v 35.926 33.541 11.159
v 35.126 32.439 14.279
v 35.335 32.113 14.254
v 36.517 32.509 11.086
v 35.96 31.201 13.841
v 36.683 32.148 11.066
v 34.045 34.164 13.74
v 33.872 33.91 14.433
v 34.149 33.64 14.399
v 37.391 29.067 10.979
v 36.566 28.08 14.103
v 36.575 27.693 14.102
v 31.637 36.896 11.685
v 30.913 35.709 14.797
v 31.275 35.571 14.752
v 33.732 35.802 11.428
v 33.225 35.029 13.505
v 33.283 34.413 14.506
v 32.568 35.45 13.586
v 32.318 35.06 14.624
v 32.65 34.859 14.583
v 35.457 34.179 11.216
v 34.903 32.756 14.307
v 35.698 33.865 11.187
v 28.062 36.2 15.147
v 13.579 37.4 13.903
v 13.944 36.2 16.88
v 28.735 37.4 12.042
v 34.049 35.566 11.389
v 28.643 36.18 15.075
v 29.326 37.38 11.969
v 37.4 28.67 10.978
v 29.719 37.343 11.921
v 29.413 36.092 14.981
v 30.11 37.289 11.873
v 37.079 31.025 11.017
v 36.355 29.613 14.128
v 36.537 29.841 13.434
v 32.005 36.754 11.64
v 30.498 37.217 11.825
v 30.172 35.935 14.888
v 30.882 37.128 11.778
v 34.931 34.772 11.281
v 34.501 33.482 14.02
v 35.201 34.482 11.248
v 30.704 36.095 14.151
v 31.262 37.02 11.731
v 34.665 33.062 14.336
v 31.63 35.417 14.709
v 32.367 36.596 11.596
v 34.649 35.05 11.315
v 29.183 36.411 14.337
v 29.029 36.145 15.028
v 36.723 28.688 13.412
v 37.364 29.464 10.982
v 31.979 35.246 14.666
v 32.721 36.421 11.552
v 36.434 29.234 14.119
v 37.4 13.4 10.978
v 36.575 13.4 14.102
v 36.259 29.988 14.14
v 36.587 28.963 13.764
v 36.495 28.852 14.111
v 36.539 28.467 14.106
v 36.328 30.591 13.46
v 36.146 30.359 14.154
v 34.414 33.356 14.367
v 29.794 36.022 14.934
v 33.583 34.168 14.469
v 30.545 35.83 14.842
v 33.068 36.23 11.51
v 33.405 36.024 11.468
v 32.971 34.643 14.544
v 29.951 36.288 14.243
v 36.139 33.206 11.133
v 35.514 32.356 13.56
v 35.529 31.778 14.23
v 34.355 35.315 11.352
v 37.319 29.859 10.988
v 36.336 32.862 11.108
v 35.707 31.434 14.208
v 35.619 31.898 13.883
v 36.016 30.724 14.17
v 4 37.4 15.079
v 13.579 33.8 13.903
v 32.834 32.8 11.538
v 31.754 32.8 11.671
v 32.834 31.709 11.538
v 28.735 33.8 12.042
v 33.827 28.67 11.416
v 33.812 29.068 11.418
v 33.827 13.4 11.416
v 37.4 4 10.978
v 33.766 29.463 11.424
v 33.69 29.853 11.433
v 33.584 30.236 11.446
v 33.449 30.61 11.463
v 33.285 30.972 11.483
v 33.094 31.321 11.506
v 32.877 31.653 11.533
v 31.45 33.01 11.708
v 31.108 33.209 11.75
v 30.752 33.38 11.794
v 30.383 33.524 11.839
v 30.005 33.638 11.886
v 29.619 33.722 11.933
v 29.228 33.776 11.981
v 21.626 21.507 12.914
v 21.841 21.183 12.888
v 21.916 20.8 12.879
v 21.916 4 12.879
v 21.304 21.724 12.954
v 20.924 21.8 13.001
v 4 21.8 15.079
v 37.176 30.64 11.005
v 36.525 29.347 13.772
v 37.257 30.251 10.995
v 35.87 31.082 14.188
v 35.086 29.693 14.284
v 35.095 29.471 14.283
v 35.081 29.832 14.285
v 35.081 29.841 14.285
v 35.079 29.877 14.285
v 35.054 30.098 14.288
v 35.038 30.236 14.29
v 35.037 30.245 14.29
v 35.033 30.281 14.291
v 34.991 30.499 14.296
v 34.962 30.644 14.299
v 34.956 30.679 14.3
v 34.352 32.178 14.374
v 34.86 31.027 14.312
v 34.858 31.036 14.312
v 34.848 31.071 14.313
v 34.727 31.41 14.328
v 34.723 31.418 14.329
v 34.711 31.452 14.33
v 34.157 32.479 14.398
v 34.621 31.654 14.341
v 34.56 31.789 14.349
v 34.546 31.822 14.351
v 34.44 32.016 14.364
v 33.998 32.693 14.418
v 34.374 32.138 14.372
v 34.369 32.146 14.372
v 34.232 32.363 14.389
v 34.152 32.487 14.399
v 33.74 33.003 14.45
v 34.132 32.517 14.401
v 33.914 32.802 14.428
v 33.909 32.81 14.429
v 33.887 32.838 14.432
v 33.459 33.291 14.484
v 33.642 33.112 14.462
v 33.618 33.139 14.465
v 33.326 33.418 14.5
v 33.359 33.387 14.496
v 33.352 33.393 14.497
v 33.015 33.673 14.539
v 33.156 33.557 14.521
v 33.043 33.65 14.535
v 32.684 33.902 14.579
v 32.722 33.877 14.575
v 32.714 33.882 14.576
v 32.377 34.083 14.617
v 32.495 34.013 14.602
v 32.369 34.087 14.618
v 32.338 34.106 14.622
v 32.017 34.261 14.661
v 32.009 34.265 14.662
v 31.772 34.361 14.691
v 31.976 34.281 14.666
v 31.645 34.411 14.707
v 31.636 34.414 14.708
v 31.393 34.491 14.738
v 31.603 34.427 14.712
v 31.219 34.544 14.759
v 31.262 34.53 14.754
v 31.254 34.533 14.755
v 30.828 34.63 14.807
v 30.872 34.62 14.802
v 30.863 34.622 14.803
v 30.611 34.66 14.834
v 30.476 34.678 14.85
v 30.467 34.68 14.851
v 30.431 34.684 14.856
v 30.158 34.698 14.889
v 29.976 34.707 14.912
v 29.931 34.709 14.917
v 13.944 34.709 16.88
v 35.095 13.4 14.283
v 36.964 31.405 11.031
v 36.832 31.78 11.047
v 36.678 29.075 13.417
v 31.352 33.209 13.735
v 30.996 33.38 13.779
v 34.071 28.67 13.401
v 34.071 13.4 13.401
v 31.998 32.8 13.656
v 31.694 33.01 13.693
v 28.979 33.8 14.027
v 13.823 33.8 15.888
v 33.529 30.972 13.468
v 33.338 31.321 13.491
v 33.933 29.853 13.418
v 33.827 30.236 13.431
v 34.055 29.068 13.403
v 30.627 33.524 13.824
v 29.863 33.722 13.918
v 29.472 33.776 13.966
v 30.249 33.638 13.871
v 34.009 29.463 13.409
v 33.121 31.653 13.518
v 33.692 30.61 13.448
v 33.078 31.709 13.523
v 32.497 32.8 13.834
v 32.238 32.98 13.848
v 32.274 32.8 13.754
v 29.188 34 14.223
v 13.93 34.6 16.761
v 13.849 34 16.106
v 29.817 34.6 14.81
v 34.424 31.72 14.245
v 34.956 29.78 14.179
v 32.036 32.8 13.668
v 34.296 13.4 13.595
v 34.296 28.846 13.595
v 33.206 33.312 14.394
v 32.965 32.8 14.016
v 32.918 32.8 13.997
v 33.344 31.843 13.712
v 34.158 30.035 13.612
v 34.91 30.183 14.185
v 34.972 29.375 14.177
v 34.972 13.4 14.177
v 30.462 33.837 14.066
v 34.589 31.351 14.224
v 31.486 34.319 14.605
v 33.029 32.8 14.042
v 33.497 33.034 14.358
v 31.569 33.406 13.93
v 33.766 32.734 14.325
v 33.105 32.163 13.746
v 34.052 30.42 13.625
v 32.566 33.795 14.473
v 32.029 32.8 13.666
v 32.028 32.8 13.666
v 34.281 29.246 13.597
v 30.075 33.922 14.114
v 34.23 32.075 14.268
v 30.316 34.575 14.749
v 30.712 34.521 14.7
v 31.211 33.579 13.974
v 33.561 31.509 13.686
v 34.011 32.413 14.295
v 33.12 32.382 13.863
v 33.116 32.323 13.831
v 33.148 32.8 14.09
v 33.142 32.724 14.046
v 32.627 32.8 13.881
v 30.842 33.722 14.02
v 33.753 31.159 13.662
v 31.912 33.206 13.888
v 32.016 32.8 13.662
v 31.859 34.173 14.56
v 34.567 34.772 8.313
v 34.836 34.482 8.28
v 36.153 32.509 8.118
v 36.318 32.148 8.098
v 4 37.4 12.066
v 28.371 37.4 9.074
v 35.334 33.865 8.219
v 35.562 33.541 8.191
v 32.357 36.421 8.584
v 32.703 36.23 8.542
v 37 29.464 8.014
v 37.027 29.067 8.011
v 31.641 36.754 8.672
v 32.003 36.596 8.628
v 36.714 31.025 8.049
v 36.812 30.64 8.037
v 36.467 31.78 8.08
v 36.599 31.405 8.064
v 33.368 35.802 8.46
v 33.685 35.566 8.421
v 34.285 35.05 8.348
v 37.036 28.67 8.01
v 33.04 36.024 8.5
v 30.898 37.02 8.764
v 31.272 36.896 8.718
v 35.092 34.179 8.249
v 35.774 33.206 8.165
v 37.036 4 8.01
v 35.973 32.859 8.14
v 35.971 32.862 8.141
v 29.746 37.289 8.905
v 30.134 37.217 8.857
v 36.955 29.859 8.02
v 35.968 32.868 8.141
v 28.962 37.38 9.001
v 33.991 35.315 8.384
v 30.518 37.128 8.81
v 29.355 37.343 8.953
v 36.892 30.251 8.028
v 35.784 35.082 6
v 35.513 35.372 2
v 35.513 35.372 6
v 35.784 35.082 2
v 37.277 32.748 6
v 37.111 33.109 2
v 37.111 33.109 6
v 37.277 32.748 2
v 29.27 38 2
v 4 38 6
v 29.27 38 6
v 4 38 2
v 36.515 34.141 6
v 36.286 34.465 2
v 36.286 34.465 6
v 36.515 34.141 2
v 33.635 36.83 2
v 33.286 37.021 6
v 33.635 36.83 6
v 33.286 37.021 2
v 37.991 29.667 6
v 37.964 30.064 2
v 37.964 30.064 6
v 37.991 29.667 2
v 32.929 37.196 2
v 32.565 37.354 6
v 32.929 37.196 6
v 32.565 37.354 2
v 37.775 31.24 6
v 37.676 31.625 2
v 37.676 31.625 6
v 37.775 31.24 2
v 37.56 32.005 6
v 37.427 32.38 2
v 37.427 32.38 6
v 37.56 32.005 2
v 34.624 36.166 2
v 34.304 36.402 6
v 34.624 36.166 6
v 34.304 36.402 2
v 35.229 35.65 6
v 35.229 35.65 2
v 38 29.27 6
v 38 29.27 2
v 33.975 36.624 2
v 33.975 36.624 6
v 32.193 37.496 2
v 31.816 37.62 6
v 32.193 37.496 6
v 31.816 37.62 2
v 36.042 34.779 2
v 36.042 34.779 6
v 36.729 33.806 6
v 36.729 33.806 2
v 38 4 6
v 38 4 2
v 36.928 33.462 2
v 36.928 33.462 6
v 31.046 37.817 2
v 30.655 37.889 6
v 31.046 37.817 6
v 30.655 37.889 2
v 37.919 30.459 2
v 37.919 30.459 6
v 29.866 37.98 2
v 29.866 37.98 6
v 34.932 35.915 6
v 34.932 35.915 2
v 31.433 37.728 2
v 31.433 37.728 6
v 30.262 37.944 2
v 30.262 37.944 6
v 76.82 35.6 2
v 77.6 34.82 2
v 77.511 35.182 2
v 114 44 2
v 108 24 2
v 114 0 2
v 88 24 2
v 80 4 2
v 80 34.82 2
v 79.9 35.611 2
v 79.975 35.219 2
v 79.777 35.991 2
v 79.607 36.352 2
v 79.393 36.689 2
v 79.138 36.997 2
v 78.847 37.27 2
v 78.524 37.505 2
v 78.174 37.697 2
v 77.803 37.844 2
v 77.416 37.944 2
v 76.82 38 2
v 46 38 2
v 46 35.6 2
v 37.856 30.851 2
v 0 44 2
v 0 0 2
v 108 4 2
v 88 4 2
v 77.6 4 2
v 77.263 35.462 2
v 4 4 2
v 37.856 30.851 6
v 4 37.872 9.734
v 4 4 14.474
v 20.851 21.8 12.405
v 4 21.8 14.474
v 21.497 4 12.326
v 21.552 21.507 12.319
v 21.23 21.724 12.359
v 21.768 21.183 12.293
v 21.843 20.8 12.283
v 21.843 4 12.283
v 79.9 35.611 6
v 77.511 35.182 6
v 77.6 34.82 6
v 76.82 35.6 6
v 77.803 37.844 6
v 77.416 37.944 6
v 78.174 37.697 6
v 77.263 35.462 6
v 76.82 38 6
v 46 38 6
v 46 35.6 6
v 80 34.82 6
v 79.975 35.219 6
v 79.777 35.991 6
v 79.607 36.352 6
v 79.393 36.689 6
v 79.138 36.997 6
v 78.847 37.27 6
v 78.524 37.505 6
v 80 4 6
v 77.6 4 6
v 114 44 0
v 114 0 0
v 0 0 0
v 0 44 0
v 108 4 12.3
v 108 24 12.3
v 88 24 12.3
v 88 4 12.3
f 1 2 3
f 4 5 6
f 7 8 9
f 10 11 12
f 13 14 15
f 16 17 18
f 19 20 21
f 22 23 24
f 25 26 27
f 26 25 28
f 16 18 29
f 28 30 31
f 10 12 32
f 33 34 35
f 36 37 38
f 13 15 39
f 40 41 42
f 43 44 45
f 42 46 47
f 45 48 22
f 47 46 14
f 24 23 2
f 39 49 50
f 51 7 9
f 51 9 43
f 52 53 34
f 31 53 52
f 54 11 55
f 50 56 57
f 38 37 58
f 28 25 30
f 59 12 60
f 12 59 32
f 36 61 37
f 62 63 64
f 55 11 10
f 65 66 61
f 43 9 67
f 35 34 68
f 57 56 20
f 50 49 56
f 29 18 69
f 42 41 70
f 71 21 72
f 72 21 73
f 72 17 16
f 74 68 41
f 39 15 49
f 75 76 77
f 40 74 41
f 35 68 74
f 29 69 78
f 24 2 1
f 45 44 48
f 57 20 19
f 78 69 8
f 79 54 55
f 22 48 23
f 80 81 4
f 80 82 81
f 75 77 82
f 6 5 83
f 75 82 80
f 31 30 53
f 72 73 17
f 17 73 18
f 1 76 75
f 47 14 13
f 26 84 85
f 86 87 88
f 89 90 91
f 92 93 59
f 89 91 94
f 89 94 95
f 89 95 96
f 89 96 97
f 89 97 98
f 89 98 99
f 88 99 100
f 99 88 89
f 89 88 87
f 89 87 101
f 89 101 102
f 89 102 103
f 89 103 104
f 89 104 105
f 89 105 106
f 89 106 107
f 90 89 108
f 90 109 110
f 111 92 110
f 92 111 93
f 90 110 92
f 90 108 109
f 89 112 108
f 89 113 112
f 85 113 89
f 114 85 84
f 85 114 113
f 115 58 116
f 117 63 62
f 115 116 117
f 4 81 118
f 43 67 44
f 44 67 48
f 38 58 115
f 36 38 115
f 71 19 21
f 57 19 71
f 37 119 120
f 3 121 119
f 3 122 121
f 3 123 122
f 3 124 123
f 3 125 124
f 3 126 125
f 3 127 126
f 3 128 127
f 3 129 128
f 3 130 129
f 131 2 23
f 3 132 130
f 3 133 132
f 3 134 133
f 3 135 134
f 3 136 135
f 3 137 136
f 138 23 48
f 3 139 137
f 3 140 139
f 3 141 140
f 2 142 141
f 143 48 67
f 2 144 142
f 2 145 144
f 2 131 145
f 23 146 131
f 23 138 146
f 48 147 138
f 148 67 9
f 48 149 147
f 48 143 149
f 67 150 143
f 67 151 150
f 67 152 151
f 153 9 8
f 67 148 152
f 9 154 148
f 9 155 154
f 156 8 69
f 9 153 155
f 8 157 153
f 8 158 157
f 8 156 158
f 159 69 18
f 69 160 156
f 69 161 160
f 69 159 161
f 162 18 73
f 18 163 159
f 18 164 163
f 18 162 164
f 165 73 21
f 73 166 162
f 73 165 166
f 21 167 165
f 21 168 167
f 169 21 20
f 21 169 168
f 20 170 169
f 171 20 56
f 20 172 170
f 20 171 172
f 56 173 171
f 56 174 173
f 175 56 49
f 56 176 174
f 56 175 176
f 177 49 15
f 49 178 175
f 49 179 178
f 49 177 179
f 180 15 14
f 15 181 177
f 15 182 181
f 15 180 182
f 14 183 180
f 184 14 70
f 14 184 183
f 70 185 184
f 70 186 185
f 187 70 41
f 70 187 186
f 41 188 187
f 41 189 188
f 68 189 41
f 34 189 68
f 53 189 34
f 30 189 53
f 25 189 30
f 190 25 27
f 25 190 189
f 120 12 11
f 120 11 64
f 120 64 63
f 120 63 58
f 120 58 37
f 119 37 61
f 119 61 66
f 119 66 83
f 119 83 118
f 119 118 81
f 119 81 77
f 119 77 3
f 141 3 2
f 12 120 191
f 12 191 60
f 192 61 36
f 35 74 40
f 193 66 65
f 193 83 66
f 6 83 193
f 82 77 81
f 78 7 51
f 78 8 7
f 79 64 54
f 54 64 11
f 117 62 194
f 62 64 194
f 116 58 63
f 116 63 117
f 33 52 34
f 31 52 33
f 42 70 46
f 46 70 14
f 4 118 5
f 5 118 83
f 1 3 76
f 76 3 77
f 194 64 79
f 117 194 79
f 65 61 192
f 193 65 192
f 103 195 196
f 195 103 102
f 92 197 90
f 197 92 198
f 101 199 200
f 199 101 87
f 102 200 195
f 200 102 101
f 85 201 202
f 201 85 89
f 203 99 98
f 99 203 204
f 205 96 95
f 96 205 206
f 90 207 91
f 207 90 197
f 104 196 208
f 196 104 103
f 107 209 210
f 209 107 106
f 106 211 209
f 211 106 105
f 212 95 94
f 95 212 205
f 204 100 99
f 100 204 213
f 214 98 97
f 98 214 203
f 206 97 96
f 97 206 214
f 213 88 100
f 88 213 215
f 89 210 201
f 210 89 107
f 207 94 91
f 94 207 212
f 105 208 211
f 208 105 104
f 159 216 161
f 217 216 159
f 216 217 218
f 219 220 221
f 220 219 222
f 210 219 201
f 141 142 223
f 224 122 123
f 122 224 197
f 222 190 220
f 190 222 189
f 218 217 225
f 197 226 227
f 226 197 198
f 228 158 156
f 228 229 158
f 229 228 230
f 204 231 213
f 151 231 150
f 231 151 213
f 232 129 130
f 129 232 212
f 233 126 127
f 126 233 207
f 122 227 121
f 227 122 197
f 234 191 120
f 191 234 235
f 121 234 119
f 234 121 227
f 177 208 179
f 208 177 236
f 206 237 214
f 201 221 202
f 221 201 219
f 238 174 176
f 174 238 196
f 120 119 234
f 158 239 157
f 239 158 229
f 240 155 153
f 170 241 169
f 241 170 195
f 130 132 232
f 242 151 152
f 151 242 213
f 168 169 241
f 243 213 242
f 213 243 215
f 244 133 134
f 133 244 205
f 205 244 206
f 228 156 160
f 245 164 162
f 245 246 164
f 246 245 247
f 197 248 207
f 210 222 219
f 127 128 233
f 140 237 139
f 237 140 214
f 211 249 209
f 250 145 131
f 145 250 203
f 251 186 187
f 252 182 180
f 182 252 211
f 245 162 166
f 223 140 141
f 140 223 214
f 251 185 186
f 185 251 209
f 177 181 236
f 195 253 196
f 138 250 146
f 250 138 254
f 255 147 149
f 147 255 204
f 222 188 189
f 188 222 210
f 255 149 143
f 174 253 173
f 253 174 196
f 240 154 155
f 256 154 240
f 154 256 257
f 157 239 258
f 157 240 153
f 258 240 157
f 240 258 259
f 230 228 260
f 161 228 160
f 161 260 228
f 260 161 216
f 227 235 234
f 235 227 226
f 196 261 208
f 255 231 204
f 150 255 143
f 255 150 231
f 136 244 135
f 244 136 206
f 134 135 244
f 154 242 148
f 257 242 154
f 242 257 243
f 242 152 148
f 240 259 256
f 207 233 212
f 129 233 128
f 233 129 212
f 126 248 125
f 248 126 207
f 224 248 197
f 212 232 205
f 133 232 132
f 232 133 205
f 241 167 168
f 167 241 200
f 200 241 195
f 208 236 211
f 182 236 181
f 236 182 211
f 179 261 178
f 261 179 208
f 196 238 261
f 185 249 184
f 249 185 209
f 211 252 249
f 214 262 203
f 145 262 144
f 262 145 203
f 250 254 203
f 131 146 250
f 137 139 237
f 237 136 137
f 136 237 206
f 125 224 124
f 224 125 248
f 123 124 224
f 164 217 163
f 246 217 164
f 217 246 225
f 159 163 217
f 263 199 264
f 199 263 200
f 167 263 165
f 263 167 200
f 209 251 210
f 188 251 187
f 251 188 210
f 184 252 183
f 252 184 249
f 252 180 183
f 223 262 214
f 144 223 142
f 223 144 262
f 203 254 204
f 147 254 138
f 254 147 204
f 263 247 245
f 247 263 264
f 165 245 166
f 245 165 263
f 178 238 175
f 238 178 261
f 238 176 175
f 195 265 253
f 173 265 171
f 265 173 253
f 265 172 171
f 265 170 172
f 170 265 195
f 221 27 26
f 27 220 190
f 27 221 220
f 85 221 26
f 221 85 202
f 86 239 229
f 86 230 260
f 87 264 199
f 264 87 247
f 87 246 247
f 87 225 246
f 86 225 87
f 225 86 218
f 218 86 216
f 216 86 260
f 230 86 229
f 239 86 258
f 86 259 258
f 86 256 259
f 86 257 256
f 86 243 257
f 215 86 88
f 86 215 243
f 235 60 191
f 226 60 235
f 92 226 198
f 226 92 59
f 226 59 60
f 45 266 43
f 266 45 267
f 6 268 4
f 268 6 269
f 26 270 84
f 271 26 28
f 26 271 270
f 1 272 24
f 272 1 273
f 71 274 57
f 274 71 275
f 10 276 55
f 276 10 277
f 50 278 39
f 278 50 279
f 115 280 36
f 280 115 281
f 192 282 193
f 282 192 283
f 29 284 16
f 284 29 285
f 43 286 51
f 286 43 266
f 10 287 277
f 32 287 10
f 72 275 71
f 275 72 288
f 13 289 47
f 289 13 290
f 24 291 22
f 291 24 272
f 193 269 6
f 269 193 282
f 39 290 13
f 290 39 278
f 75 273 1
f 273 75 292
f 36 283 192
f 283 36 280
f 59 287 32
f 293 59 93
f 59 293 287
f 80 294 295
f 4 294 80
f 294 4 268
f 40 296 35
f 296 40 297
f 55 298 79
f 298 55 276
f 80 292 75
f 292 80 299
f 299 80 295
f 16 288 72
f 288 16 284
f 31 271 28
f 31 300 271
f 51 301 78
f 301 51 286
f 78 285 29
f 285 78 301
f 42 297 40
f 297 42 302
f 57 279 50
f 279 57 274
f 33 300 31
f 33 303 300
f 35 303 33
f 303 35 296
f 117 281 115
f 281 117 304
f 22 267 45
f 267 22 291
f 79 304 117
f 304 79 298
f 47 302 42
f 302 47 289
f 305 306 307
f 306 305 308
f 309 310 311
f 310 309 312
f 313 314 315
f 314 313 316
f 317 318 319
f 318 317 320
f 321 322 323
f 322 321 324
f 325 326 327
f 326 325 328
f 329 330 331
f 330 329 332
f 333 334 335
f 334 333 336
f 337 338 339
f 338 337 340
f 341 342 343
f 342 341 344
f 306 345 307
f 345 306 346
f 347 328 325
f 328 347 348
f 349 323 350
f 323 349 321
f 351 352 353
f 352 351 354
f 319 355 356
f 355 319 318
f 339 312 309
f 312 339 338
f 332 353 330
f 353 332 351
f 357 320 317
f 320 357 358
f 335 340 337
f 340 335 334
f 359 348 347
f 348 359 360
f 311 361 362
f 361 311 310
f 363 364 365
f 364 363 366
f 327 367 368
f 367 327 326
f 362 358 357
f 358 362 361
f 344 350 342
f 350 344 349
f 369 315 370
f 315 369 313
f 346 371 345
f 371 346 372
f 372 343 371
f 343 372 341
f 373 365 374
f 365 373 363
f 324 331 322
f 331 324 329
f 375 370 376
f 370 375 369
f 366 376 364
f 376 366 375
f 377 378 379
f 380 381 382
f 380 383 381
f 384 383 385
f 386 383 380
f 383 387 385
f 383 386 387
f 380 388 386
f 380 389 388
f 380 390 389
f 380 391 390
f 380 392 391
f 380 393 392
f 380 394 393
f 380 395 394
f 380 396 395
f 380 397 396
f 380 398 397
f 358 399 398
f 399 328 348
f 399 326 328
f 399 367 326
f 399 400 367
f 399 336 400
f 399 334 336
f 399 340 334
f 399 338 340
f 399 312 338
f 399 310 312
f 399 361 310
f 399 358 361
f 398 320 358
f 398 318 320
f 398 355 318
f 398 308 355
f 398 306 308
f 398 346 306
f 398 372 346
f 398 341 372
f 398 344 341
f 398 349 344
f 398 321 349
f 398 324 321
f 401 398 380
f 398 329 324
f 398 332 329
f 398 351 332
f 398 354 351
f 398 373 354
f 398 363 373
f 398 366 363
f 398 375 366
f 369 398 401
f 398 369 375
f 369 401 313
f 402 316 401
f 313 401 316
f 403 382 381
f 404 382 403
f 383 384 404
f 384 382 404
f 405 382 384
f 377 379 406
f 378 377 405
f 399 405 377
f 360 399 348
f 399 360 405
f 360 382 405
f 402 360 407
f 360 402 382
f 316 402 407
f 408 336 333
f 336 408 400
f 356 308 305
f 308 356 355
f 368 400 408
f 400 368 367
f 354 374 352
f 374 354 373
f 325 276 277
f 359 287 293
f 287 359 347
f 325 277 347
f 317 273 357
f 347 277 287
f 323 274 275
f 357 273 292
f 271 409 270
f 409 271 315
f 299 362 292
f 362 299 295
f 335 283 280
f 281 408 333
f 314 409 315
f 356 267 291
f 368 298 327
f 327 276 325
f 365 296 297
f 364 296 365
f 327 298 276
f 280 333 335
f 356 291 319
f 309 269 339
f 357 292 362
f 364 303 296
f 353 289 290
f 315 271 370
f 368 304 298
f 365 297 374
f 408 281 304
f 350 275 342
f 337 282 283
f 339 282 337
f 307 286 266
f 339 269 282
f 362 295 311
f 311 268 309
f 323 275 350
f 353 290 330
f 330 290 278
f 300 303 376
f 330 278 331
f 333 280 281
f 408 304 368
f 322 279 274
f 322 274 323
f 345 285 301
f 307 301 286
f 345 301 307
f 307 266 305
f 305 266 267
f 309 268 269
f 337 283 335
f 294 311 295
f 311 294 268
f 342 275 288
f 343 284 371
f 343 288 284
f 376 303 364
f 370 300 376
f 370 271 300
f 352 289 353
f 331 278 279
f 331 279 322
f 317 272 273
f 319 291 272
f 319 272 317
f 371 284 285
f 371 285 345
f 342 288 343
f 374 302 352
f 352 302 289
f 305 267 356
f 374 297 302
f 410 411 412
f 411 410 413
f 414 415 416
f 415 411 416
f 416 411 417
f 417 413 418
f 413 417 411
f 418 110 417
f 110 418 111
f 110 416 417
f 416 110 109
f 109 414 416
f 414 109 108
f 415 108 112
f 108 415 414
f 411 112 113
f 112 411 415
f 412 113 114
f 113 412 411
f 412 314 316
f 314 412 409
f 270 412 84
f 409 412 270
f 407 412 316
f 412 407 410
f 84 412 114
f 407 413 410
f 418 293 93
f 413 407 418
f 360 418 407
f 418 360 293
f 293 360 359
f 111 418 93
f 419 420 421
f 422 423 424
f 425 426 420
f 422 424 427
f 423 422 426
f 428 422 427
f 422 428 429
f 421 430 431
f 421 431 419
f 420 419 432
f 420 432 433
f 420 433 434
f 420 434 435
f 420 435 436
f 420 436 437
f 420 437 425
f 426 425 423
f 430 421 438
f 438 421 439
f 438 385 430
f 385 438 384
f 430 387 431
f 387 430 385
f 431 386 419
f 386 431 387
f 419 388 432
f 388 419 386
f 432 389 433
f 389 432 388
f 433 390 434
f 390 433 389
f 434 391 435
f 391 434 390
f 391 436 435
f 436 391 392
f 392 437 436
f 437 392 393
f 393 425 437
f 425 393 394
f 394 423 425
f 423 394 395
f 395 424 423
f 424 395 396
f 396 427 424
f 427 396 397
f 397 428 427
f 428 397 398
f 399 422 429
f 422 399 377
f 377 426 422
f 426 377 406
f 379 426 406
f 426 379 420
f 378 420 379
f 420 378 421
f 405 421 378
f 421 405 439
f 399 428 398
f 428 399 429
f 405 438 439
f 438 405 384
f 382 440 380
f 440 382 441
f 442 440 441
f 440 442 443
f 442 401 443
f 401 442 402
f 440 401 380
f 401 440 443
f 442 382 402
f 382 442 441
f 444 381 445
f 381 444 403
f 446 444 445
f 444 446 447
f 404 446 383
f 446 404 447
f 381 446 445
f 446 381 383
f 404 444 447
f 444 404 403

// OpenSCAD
// =============================================================================
// tilt_module.scad -- a passive fixed-angle tilt fixture for a liquid handler
// deck. It holds one ANSI/SLAS-footprint plate or reservoir at a shallow angle
// so residual liquid pools at one side of each well and a tip can reach more of
// it. There is no hinge, no actuator, and no adjustment: the angle is a printed
// constant, which is the point. An adjustable angle is an angle nobody records.
//
// WHY THIS EXISTS
//
// On a bead cleanup, an elution, or a reservoir with 400 uL left in it, the last
// few microliters are the product. A flat plate on a flat deck leaves them
// spread across the whole well bottom in a film the tip cannot chase. Tilting
// the vessel concentrates the same volume into a smaller footprint at one edge.
// That is the entire mechanism. It is geometry, not chemistry.
//
// WHAT THIS FILE DOES NOT DO
//
// It does not tell you how much liquid you will recover. No number in this file
// is a recovery figure, and none should be added, because recovery depends on
// the well geometry, the liquid class, the tip, the aspiration profile, and the
// surface energy of a molded polymer this model knows nothing about. The only
// honest recovery number is one you weighed. hardware/README.md gives the
// acceptance test that produces it. Until that test has been run, this fixture
// is an untested idea with a part number.
//
// WHAT IT COMPUTES
//
// Everything derived here is a function, and every function echoes its result at
// render time (see report() at the bottom). Two of those numbers decide whether
// the fixture is usable at all before any liquid is involved:
//
//   tip_reach_delta_mm()  how much deeper the head must travel at the far corner
//   stack_top_mm()        how much taller the loaded deck position becomes
//
// Where an input has not been measured, the corresponding function returns
// nothing and the report says NOT COMPUTED. It does not substitute a plausible
// value. An unmeasured fixture is an unproven one, and a model that quietly
// invents the missing measurement makes that impossible to notice.
//
// SAFETY -- DECK CRASH
//
// A fixture that is not positively located on the deck is a crash. It is heavier
// and taller than the plate the deck position was built for, its center of mass
// is higher, and if it can slide, rotate, or walk under gantry acceleration then
// the head's taught coordinates point at where it used to be. A tip strike on a
// printed wedge does not stop a Z axis; it snaps tips, shears the fixture, or
// drives the head into the deck. This file therefore refuses to render the full
// fixture until deck_measured is set true (see the assert in tilt_fixture()).
// That refusal is deliberate. Print the coupon, measure your deck position, then
// come back. Also re-teach every affected labware position after installing the
// fixture -- the plate no longer sits where it sat, in any of three axes.
//
// SAFETY -- WHAT THIS MATERIAL MAY TOUCH
//
// This is a HOLDER. Nothing printed here is qualified to contact samples,
// reagents, cells, or media, and dimensional conformity to ANSI/SLAS is not
// evidence of fitness for contact -- those standards say nothing about material,
// leachables, cytotoxicity, sterility, or nuclease status. FDM parts carry 4-6%
// internal porosity even at 100% infill (Wang et al., Polymers 11(7):1154,
// 2019, X-ray CT, 4.05-6.32% across raster settings) and the voids connect to
// the outer surface, so they wick liquid in and cannot be reliably cleaned;
// vapor smoothing reduces roughness without sealing the part (Popescu et al.,
// Polymers 13(23):4249, 2021). Many photopolymer resins remain cytotoxic after
// full post-cure. Keep the certified consumable between this part and the
// sample: the plate is the barrier. Wipe-down of the fixture is housekeeping,
// not decontamination. Do not autoclave -- PLA, PETG, ABS and ASA all have a
// glass transition below 121 C and will relax printed-in stress and move.
//
// PRECEDENT
//
// Parameter-block style follows hardware/tube_nest.scad in the bay-hack repo:
// every dimension named at the top, nothing magic buried in the geometry, and a
// fit coupon printed before anything large.
// =============================================================================

$fa = 2;
$fs = 0.4;

// Which solid to emit. Print "coupon" first. Always.
part = "coupon";  // "coupon" | "fixture" | "both"


// =============================================================================
// 1. THE LABWARE BEING HELD
//
// Defaults are the ANSI/SLAS nominals. They are nominals: a conforming plate is
// allowed to differ from every one of them, and the tolerance that governs a
// pocket is not the one people quote.
// =============================================================================

// ANSI/SLAS 1-2004 (R2012) 4.1.1.1 nominal footprint. mm.
plate_len_mm = 127.76;
plate_wid_mm = 85.48;

// THE TOLERANCE THAT ACTUALLY SIZES THE POCKET. mm, applies to the overall
// dimension (not per side).
//
// SLAS 1 states TWO footprint tolerances and the commonly quoted one is the
// wrong one for this job. 4.1.1.1 gives +/- 0.25 mm, but only within 12.7 mm of
// the four outside corners. 4.1.1.2 gives +/- 0.5 mm anywhere else along the
// side. A conforming plate may bow outward by 0.5 mm at mid-side. A pocket cut
// to 127.76 +/- 0.25 jams a legal plate, and it jams it in the middle where you
// cannot see why. Use the loose figure.
plate_footprint_tol_mm = 0.5;

// SLAS 1 4.1.2.1 corner radius is 3.18 +/- 1.6 mm, a permitted range of 1.58 to
// 4.78 mm -- a 3x spread. A clearance feature cut to the 3.18 nominal binds on
// every plate at the top of the range. Use the maximum for anything the corner
// has to fit into. mm.
plate_corner_r_max_mm = 4.78;

// ANSI/SLAS 3-2004 bottom outside flange. FIVE mutually exclusive variants
// exist and a plate is required to declare which one it meets:
//   4.1 short 2.41   4.2 medium 6.10   4.3 tall 7.62
//   4.4 short with interruptions 2.41  4.5 dual 2.41 short sides / 7.62 long
// all +/- 0.38 mm from Datum A. "SBS compliant" on a vendor page does not tell
// you which. The retaining lip has to engage this flange and nothing above it,
// so this is a load-bearing input, not documentation. Set it from the plate's
// own datasheet. mm.
plate_flange_h_mm   = 6.10;
plate_flange_tol_mm = 0.38;

// Plate height from Datum A. ANSI/SLAS 2-2004 4.1.1.2 gives 14.35 +/- 0.76 mm
// overall -- but ONLY for a standard-height microplate. Deep-well plates,
// PCR plates and reservoirs keep the SLAS 1 footprint and abandon the SLAS 2
// height entirely; published deep-well products sit near 44 mm, which is a
// product spec and not a standard. If you are tilting a deep-well plate or a
// reservoir, put ITS measured height here, because this number and the tilt
// angle together set how much Z the fixture consumes. mm.
plate_height_mm = 14.35;

// Height of the loaded plate's center of mass above its own bottom face. mm.
// NOT SPECIFIED BY ANY SLAS STANDARD -- no standard gives plate mass or mass
// distribution, and a full deep-well plate is a different object from an empty
// one. Leave negative and the tip-over check reports NOT COMPUTED rather than
// inventing a number. Measure it if you care about the answer.
plate_cg_height_mm = -1;

// Well grid, ANSI/SLAS 4-2004 4.1 (96), 4.2 (384), 4.3 (1536). Used only to
// compute the span between the first and last well CENTERS, which is the span
// the tips actually have to cover. Offsets are from the outside edge and are
// listed for completeness; the reach math needs the pitch and the counts.
//   96:   offsets 14.38 / 11.24, pitch 9.0
//   384:  offsets 12.13 /  8.99, pitch 4.5
//   1536: offsets 11.005 / 7.865, pitch 2.25
well_cols       = 12;
well_rows       = 8;
well_pitch_mm   = 9.0;
well_a1_x_mm    = 14.38;
well_a1_y_mm    = 11.24;


// =============================================================================
// 2. THE ANGLE
// =============================================================================

// Tilt about the plate's SHORT axis: the +x end of the plate goes down, so
// liquid runs toward the column-12 end. deg.
//
// This is the single most expensive parameter in the file. Every millimeter of
// extra deck height and every millimeter of extra Z travel scales with it, and
// no amount of thinning the base buys any of that back (see stack_budget()).
// Shallow is not timid: at 7 deg the far well bottom is already 12 mm below the
// near one across a 96-well plate.
tilt_angle_deg = 7;

// Optional second tilt about the plate's LONG axis: the +y edge goes down.
// Nonzero turns the pooling point from an edge into a corner, at the cost of
// making the true slope steeper than either component (see max_slope_deg()).
// Default 0 -- single-axis tilt is easier to print, easier to seat, and easier
// to reason about, and most well geometries pool acceptably on one axis. deg.
cross_tilt_deg = 0;


// =============================================================================
// 3. CLEARANCE -- the parameter you tune, and the one nobody tunes enough
//
// The printed part is not the model. It comes out of the machine a different
// size, and the difference is not a constant you can look up:
//
//   - Shrinkage is material and grade dependent, and it is not published.
//     Filament technical data sheets generally do not carry a shrinkage figure
//     at all (checked directly on Polymaker PETG V2.0, Polymaker ASA, and
//     3DXTech 3DXMAX ABS -- none list one). Every per-material percentage
//     circulating online is a slicer default or a community measurement.
//   - Slicer defaults disagree with each other. OrcaSlicer ships filament_shrink
//     of 99.95% for one vendor's PLA, 99.85% PETG, 99.487% ABS and ASA, while
//     another vendor's profiles in the same repository ship 100% for all four.
//     That is a 0.5% disagreement on ABS between two profiles in one slicer.
//     0.5% of 127.76 mm is 0.64 mm, which is larger than the entire SLAS
//     footprint tolerance.
//   - Desktop FDM accuracy is quoted at about +/- 0.5% with a +/- 0.5 mm floor,
//     and tolerance scales with length, so a good calibration cube proves
//     nothing about a 128 mm pocket.
//   - The first layers are the least trustworthy region of the part. Squish
//     widens them; PrusaSlicer's own profiles ship 0.2 mm of elephant-foot
//     compensation for a 0.4 mm nozzle. The bottom of this fixture is exactly
//     where the registration feature lives.
//   - Repeatability is far better than accuracy -- a few hundredths of a
//     millimeter of run-to-run spread against tenths of accuracy error. That
//     asymmetry is what makes measure-and-compensate work: your printer
//     reproduces its own error reliably enough to cancel it.
//
// So: do not trust the nominal. Print the coupon, measure it with calipers
// against coupon_gauge_mm, and set the two clearances below from what you
// measured. Then reprint the coupon and confirm. That loop is the design
// process; the numbers below are only its starting point.
// =============================================================================

// Per side, between the plate and the pocket walls. This is a HOLE the plate
// drops into, and printers usually make holes undersize. mm.
clearance_mm = 0.35;

// Per side, between the fixture's registration skirt and the deck nest. This is
// a SHAFT going into someone else's hole, and printers usually make shafts
// oversize. Opposite sign of error, so it gets its own parameter. Do not slave
// it to clearance_mm even though the first-guess magnitude is similar. mm.
deck_clearance_mm = 0.30;


// =============================================================================
// 4. PLATFORM AND RETAINING LIPS
//
// LIP GEOMETRY -- what holds the plate, and what it is holding against
//
// The plate on the tilted seat wants to slide downhill. Whether friction alone
// would hold it is NOT COMPUTED anywhere in this file, and cannot be: the static
// coefficient between a printed lip and a molded polypropylene skirt is not
// published, changes with layer orientation and surface finish, and drops
// further when either surface is wet with buffer or ethanol. Design as if
// friction is zero. The lips are the only thing holding the plate.
//
// The plate therefore does not center itself in the pocket. It slides until it
// touches the two DOWNHILL corner lips, and those lips are the datum. Every
// reach number in this file is referenced to that seated position, not to a
// centered one.
//
// The lip height has a window, and both ends of it are real:
//
//   lower bound  the lip must stand proud enough to engage the flange face
//                rather than the plate's bottom edge break. SLAS figure Note 4
//                in all four dimensional standards states "Dimensions and
//                tolerances do not include draft" -- molded plates carry draft
//                angles the standard excludes and does not publish, so the
//                flange face is not vertical and the exact contact height
//                cannot be computed from the standard. A lip shorter than about
//                1.2 mm is contacting whatever the draft leaves it, which is
//                not a designed contact.
//
//   upper bound  the lip must stay BELOW the minimum flange height for the
//                declared variant, or it stops pushing on the flange and starts
//                pushing on the plate body -- into gripper jaw travel, into a
//                skirt chamfer that will cam the plate upward, or into the well
//                region. Minimum flange height is nominal minus 0.38 mm.
//
// lip_window_ok() checks that window against the declared variant and the
// report prints PASS or FAIL. On a SLAS 3 4.1 short-flange plate (2.41 nominal,
// 2.03 minimum) the default 3.0 mm lip FAILS, correctly -- short-flange plates
// need a shorter lip and there is not much window left.
//
// Corner lips rather than continuous rails, for three reasons:
//   1. SLAS 3 4.4 permits a single interruption on center of each long side.
//      A continuous long-side rail can land on that interruption; a corner lip
//      cannot, because the interruption edges are at least 47.8 mm from the
//      nearest part edge.
//   2. The mid-side gaps are where a gripper puts its jaws.
//   3. The downhill mid-side gap is the drain path for anything spilled.
//
// The lip is loaded as a transverse cantilever, and its root is a layer
// interface -- the weakest direction in an FDM part. That is why lip_thickness
// is generous and why the outer face tapers: the section modulus is highest
// exactly where the bending moment is. See README for the orientation argument.
// =============================================================================

// Corner lips are the default and the argued-for choice above. "full" exists
// because some reservoirs have no flange worth catching at a corner, and it
// keeps its own downhill drain slot.
lip_style = "corners";  // "corners" | "full"

lip_height_mm        = 3.0;   // downhill and side lips, above the seat plane, mm
lip_height_uphill_mm = 3.0;   // uphill lips -- reduce for gripper clearance, mm
lip_thickness_mm     = 2.4;   // at the lip top; 6 walls at a 0.4 mm nozzle, mm
lip_fillet_mm        = 1.2;   // extra thickness at the lip root, tapered, mm
lip_arm_mm           = 24.0;  // length of each corner-lip arm along the side, mm
lip_lead_in_mm       = 1.0;   // chamfer at the lip top inner edge, guides entry, mm
lip_min_engage_mm    = 1.2;   // lower bound of the lip height window, mm
lip_flange_margin_mm = 0.5;   // how far the lip stays below the minimum flange, mm

// Platform slab under the seat. Thin enough not to waste Z, thick enough that
// the seat is not a drum. mm.
platform_thickness_mm = 3.0;

// The seat is relieved in the middle so the plate lands on a perimeter band
// rather than on whatever high spot the print left. A printed plane cannot be
// flatter than the bed it was printed on, mesh leveling conforms the first layer
// TO the bed rather than correcting it, and a 128 mm seat that bulges 0.2 mm in
// the middle makes the plate rock. A relieved center converts an unknown
// flatness into a known three-sided contact. mm.
seat_band_mm         = 12.0;
seat_relief_depth_mm = 0.6;

// Drain channel from the relieved center out through the downhill edge. A spill
// that pools under a plate in a deck nest is both a contamination problem and a
// seating problem -- the plate floats on the film and stops sitting where it was
// taught. Liquid must have somewhere to go that is not "under the plate". mm.
drain_slot_w_mm = 8.0;


// =============================================================================
// 5. BASE AND DECK REGISTRATION
//
// UNMEASURED IS UNTRUSTED. deck_measured stays false until you have put calipers
// on your own deck position, and tilt_fixture() will not render until you flip
// it. See the SAFETY -- DECK CRASH note in the header for why this is a hard
// stop and not a warning.
// =============================================================================

deck_measured = false;

// "slas_skirt" -- the fixture's own base carries an ANSI/SLAS-1 footprint skirt
//                 and drops into the deck nest exactly the way a plate does.
//                 Preferred: it reuses location the deck already provides, and
//                 needs one measurement (the nest depth) rather than a hole
//                 pattern.
// "post"       -- locating posts drop into measured holes in the deck.
// "none"       -- NOTHING LOCATES THE FIXTURE. Only defensible when the fixture
//                 is clamped or bolted by other means. The report says so out
//                 loud every render.
registration_style = "slas_skirt";

// MEASURE. Depth from the deck nest rim down to the surface a plate's own
// footprint rests on. Negative means unmeasured. mm.
deck_nest_depth_mm = -1;

// MEASURE. Width of the nest rim, if the fixture is to rest on it. Negative
// means unmeasured. mm.
deck_nest_rim_w_mm = -1;

// Which surface carries the fixture's weight. These are mutually exclusive and
// a fixture that is unsure which one it is will rock, because both cannot be in
// contact at once on a printed part.
//   "nest_floor" -- the skirt runs deeper than the nest and the body shoulder
//                   floats clear of the rim by seat_relief_mm.
//   "nest_rim"   -- the skirt runs shallower and the body shoulder lands on the
//                   rim, with the skirt bottom floating.
seats_on       = "nest_floor";
seat_relief_mm = 0.4;  // the deliberate gap on whichever surface is NOT carrying, mm

// Registration skirt wall. Also the minimum wall anywhere in the part. mm.
wall_mm = 2.4;

// Post registration, if registration_style is "post". All MEASURED off your
// deck. Negative means unmeasured and the model will refuse. mm.
//
// TWO posts, not four. Four posts in four holes over-constrain the part: with
// desktop FDM positional error on a 100 mm span, at least one post binds and the
// fixture seats on three of them, rocking. Two posts locate position and
// rotation, which is all that is needed. If the deck offers four holes, use two
// and leave the others empty; if you must use more, one hole has to become a
// slot, and this model does not cut slots for you.
reg_post_d_mm       = -1;
reg_post_pitch_x_mm = -1;
reg_post_h_mm       = -1;

// How deep the registration feature engages the deck. Derived for the skirt
// case, explicit for posts. Reported so it can be sanity-checked against the
// deck: a 1 mm engagement is decoration, not registration. mm.
reg_engage_min_mm = 2.0;

// Flat slab spanning the whole footprint, under the wedge. Takes the
// registration loads and gives the wedge something continuous to sit on. mm.
base_thickness_mm = 4.0;

// Minimum wedge thickness at the LOW corner, above the base slab. Without it the
// wedge tapers to a knife edge that will not print and will not survive being
// picked up. mm.
min_lift_mm = 2.0;

// Extra footprint on the body beyond the projected platform, so the wedge walls
// slope slightly inward going up and never overhang. mm.
body_margin_mm = 0.6;


// =============================================================================
// 6. LOW PROFILE
//
// Why total stack height matters, and what it is actually made of.
//
// Raising the plate spends three budgets at once:
//   - the head's Z envelope. The tip has to reach the bottom of the LOWEST well
//     while the head still has travel left, and the head has to clear the
//     HIGHEST point of the plate on every move in and out.
//   - the gripper's approach. A plate mover taught to grab a plate at deck
//     height will now find it 25 mm higher and tilted. The jaws must still close
//     on the flange, and the approach path must clear the lips.
//   - the neighbors. This body is wider than the plate it holds. Check the
//     adjacent deck positions before you print, not after.
//
// The load-bearing fact is in stack_budget(): the fixed part of the stack (base,
// lift, platform slab) is a few millimeters, and the angle-driven part is the
// plate length times sin(tilt). At 7 degrees across a 128 mm pocket that is
// about 15.7 mm, and low_profile does not touch it. You cannot thin your way
// out of the angle. If the stack does not fit, the angle comes down or the
// fixture does not get used.
// =============================================================================

low_profile = false;

low_profile_base_thickness_mm     = 2.4;
low_profile_min_lift_mm           = 1.2;
low_profile_platform_thickness_mm = 2.0;


// =============================================================================
// 7. TEST COUPON
//
// A 90 x 55 mm part that carries the registration skirt corner, one downhill
// corner lip cut from the real geometry, and a caliper witness block. It prints
// in minutes instead of hours and it is the only thing standing between a wrong
// clearance and a wasted afternoon.
//
// The coupon validates FEATURES, not the whole-footprint fit. It tells you what
// your printer did to a wall thickness, a corner radius, a vertical face and a
// 20 mm nominal. It cannot tell you whether a 127.76 mm skirt fits your nest,
// because it is not 127.76 mm long. Measure the gauge, compute your machine's
// actual scale error, apply it to the full length, and only then print the
// fixture.
// =============================================================================

coupon_gauge_mm    = 20.0;  // nominal witness block in X and Y. Measure both. mm
coupon_gauge_z_mm  = 10.3;  // deliberately not a multiple of a common layer height, mm
coupon_pad_t_mm    = 2.0;   // common pad so the pieces stay together, mm
coupon_sample_mm   = 34.0;  // how much of each real corner to keep, mm


// =============================================================================
// 8. DERIVED GEOMETRY -- functions, never stored constants
// =============================================================================

function r2(v) = round(v * 100) / 100;

// Low-profile substitutions.
function base_t()  = low_profile ? low_profile_base_thickness_mm : base_thickness_mm;
function lift()    = low_profile ? low_profile_min_lift_mm : min_lift_mm;
function plat_t()  = low_profile ? low_profile_platform_thickness_mm : platform_thickness_mm;

// The pocket. The footprint tolerance is on the OVERALL dimension so it is added
// once; the clearance is per side so it is added twice. Conflating the two is
// the most common way to get this wrong by half a millimeter.
function pocket_len() = plate_len_mm + plate_footprint_tol_mm + 2 * clearance_mm;
function pocket_wid() = plate_wid_mm + plate_footprint_tol_mm + 2 * clearance_mm;
function pocket_r()   = plate_corner_r_max_mm + clearance_mm;

// The platform carrying the pocket and the lips, measured IN the seat plane.
function plat_len() = pocket_len() + 2 * (lip_thickness_mm + lip_fillet_mm);
function plat_wid() = pocket_wid() + 2 * (lip_thickness_mm + lip_fillet_mm);
function plat_r()   = pocket_r() + lip_thickness_mm + lip_fillet_mm;

// Unit normal of the seat plane, z component. Everything vertical scales by it.
function seat_nz() = cos(cross_tilt_deg) * cos(tilt_angle_deg);

// TRUE slope of the seat plane. With both tilts nonzero this is steeper than
// either component, which is the trap in compound tilt: two comfortable-sounding
// 6 degree tilts make an 8.5 degree plane.
function max_slope_deg() = acos(seat_nz());

// ---------------------------------------------------------------------------
// tip_reach_delta_mm()
//
// THE number that decides whether the tips can still bottom out.
//
// Two well bottoms separated by dx along the plate's long axis and dy along its
// short axis are separated vertically, once the plate is tilted, by
//
//     dz = dx * sin(tilt) + dy * sin(cross) * cos(tilt)
//
// sin, not tan: the wells are separated by dx measured ALONG the plate, which is
// now the hypotenuse rather than the deck projection. Using tan overstates the
// drop, and at shallow angles the two differ by less than a percent, which is
// exactly the kind of error that survives review.
//
// The plate seats against the DOWNHILL corner lips, so the near corner is the A1
// end and the far corner is the last well of the last column. The head has to
// travel tip_reach_delta_mm() further down at the far corner than at the near
// one, on top of whatever the fixture already added. If the head is near the end
// of its Z stroke at the near corner -- which is where a deep-well plate on a
// tall fixture puts it -- the far corner is where it runs out.
//
// Span is between well CENTERS, from SLAS 4: (cols - 1) * pitch by
// (rows - 1) * pitch. For a 96-well plate that is 99.0 x 63.0 mm, not the
// 127.76 x 85.48 footprint. Using the footprint overstates the drop by about
// 30%, which sounds conservative until it talks somebody out of a workable
// angle.
// ---------------------------------------------------------------------------
function well_span_x_mm() = (well_cols - 1) * well_pitch_mm;
function well_span_y_mm() = (well_rows - 1) * well_pitch_mm;

function drop_along_seat_mm(dx, dy) =
  dx * sin(tilt_angle_deg) + dy * sin(cross_tilt_deg) * cos(tilt_angle_deg);

function tip_reach_delta_mm() =
  drop_along_seat_mm(well_span_x_mm(), well_span_y_mm());

// Same computation across the plate footprint rather than the well grid. This is
// the one that matters for the plate's own corners and for the lips.
function footprint_drop_mm() = drop_along_seat_mm(pocket_len(), pocket_wid());

// Height of the seat plane under a given well center, in the deck frame. The
// plate seats against the DOWNHILL lips, so a well's height is set by how far it
// sits from the downhill edges -- which is where the SLAS 4 first-well offsets
// stop being trivia and start being the thing that positions the tip. Column and
// row are 1-based; column 1 is the A1 end, which is uphill.
function well_dist_from_downhill_x_mm(col) =
  plate_len_mm - (well_a1_x_mm + (col - 1) * well_pitch_mm);
function well_dist_from_downhill_y_mm(row) =
  plate_wid_mm - (well_a1_y_mm + (row - 1) * well_pitch_mm);

function well_seat_z_mm(col, row) =
  plate_low_seat_z()
  + drop_along_seat_mm(well_dist_from_downhill_x_mm(col),
                       well_dist_from_downhill_y_mm(row));

// ---------------------------------------------------------------------------
// Vertical stack, referenced to the plane a plate's own footprint would rest on
// in this deck position -- so a plate sitting flat has its bottom at z = 0 and
// every number below is directly comparable to "no fixture".
// ---------------------------------------------------------------------------

// How far the registration feature engages the deck, and where the body starts.
function skirt_h_mm() =
  registration_style != "slas_skirt" ? 0
  : deck_nest_depth_mm < 0 ? 0
  : seats_on == "nest_floor" ? deck_nest_depth_mm + seat_relief_mm
  : deck_nest_depth_mm - seat_relief_mm;

function body_bottom_z() = registration_style == "slas_skirt" ? skirt_h_mm() : 0;
function body_top_z()    = body_bottom_z() + base_t();

// Seat plane at the low (downhill) corner of the PLATFORM.
function seat_low_z() = body_top_z() + lift() + plat_t() * seat_nz();

// Seat plane under the plate's own low and high corners. The plate is inset from
// the platform edge by one lip thickness plus its fillet, so its low corner sits
// a hair above the platform's.
function plate_low_seat_z() =
  seat_low_z() + drop_along_seat_mm(lip_thickness_mm + lip_fillet_mm,
                                    lip_thickness_mm + lip_fillet_mm);

function plate_high_seat_z() = plate_low_seat_z() + footprint_drop_mm();

// Highest point of the loaded plate above the deck datum. Valid only if
// plate_height_mm is this plate's real height -- see the SLAS 2 note in section 1.
function stack_top_mm() = plate_high_seat_z() + plate_height_mm * seat_nz();

// What the stack is made of. Returns [fixed, angle_driven, plate].
function stack_budget() = [
  seat_low_z(),                       // skirt + base + lift + platform slab
  footprint_drop_mm(),                // set by the angle alone
  plate_height_mm * seat_nz()         // the plate itself
];

// How much taller this deck position became versus a plate sitting flat.
function stack_penalty_mm() = stack_top_mm() - plate_height_mm;

// Body footprint. Sized from the projection of the tilted platform plus a
// margin, so the wedge walls lean inward going up and never overhang.
function body_len() = plat_len() * cos(tilt_angle_deg) + 2 * body_margin_mm;
function body_wid() = plat_wid() * cos(cross_tilt_deg) + 2 * body_margin_mm;
function body_r()   = plat_r();

// How far the body overhangs the SLAS skirt on each side. This is what collides
// with the next deck position.
function overhang_x_mm() = (body_len() - plate_len_mm) / 2;
function overhang_y_mm() = (body_wid() - plate_wid_mm) / 2;

// Registration skirt outline: an SLAS footprint minus clearance, so it drops
// into a nest built for a plate.
function skirt_len() = plate_len_mm - 2 * deck_clearance_mm;
function skirt_wid() = plate_wid_mm - 2 * deck_clearance_mm;
function skirt_r()   = 3.18;  // SLAS 1 nominal; a shaft wants the SMALL radius

// The lip height window, from the declared flange variant.
function flange_min_mm() = plate_flange_h_mm - plate_flange_tol_mm;
function lip_max_mm()    = flange_min_mm() - lip_flange_margin_mm;
function lip_window_ok() =
  lip_height_mm >= lip_min_engage_mm && lip_height_mm <= lip_max_mm();

// Tip-over about the downhill lip contact line. Refuses without a measured CG.
function tip_over_angle_deg() =
  plate_cg_height_mm <= 0 ? undef
  : atan((plate_len_mm / 2) / plate_cg_height_mm);

// Pivot height for the platform rotation, chosen so the platform's bottom-face
// low corner lands exactly lift() above the base slab.
function pivot_z() =
  body_top_z() + lift()
  + (plat_len() / 2) * sin(tilt_angle_deg)
  + (plat_wid() / 2) * sin(cross_tilt_deg) * cos(tilt_angle_deg)
  + plat_t() * seat_nz();


// =============================================================================
// 9. REPORT
//
// Printed on every render, including the coupon. Anything that depends on an
// unmeasured input says NOT COMPUTED and names the parameter.
// =============================================================================

module report() {
  echo("");
  echo("=== tilt_module.scad ===");
  echo(str("part                    : ", part,
           low_profile ? "  (low profile)" : ""));
  echo("");
  echo("--- angle ---");
  echo(str("tilt / cross            : ", tilt_angle_deg, " / ", cross_tilt_deg, " deg"));
  echo(str("true seat plane slope   : ", r2(max_slope_deg()), " deg"));
  echo("");
  echo("--- reach ---");
  echo(str("well grid               : ", well_cols, " x ", well_rows,
           " at ", well_pitch_mm, " mm pitch"));
  echo(str("well center span        : ", r2(well_span_x_mm()), " x ",
           r2(well_span_y_mm()), " mm"));
  echo(str("TIP REACH DELTA         : ", r2(tip_reach_delta_mm()),
           " mm extra Z at the far corner"));
  echo(str("seat under first well   : ", r2(well_seat_z_mm(1, 1)),
           " mm above the deck datum  (uphill, shallowest)"));
  echo(str("seat under last well    : ", r2(well_seat_z_mm(well_cols, well_rows)),
           " mm above the deck datum  (downhill, deepest)"));
  echo(str("plate corner drop       : ", r2(footprint_drop_mm()), " mm"));
  echo("");
  echo("--- vertical stack, versus a plate sitting flat ---");
  echo(str("  fixed  (base+lift+slab): ", r2(stack_budget()[0]), " mm"));
  echo(str("  angle  (irreducible)   : ", r2(stack_budget()[1]), " mm"));
  echo(str("  plate                  : ", r2(stack_budget()[2]), " mm"));
  echo(str("top of plate above datum : ", r2(stack_top_mm()), " mm"));
  echo(str("EXTRA Z CONSUMED         : ", r2(stack_penalty_mm()),
           " mm -- head envelope and gripper approach must both still clear"));
  echo(str("plate height basis       : ", plate_height_mm == 14.35
           ? "SLAS 2 standard-height nominal -- WRONG for deep-well/PCR/reservoir"
           : "operator supplied"));
  echo("");
  echo("--- footprint ---");
  echo(str("pocket                  : ", r2(pocket_len()), " x ", r2(pocket_wid()),
           " mm  (tol once, clearance twice)"));
  echo(str("body                    : ", r2(body_len()), " x ", r2(body_wid()), " mm"));
  echo(str("overhang beyond SLAS     : ", r2(overhang_x_mm()), " mm per side in X, ",
           r2(overhang_y_mm()), " mm per side in Y -- CHECK NEIGHBORING DECK POSITIONS"));
  echo("");
  echo("--- lips ---");
  echo(str("flange variant declared : ", plate_flange_h_mm, " +/- ", plate_flange_tol_mm,
           " mm  (minimum ", r2(flange_min_mm()), ")"));
  echo(str("lip height window       : ", lip_min_engage_mm, " to ", r2(lip_max_mm()), " mm"));
  echo(str("lip height ", lip_height_mm, " mm       : ",
           lip_window_ok() ? "PASS"
           : lip_height_mm < lip_min_engage_mm
             ? "FAIL -- too short to engage the flange face"
             : "FAIL -- taller than the minimum flange, will push on the plate body"));
  echo(str("static hold without lips: NOT COMPUTED -- friction coefficient between a ",
           "printed lip and a molded skirt is unpublished and changes when wet. ",
           "Design as if it is zero."));
  echo(str("lip load                : NOT COMPUTED -- no SLAS standard specifies ",
           "plate mass. Weigh your loaded plate."));
  echo(str("tip-over angle          : ",
           plate_cg_height_mm <= 0
             ? "NOT COMPUTED -- set plate_cg_height_mm from a measurement"
             : str(r2(tip_over_angle_deg()), " deg, versus ", r2(max_slope_deg()),
                   " deg of tilt")));
  echo("");
  echo("--- deck registration ---");
  echo(str("style                   : ", registration_style));
  echo(str("deck measured           : ", deck_measured ? "yes" : "NO"));
  echo(str("nest depth              : ", deck_nest_depth_mm < 0
           ? "NOT MEASURED" : str(deck_nest_depth_mm, " mm")));
  echo(str("skirt engagement        : ", skirt_h_mm() <= 0
           ? "NOT COMPUTED"
           : str(r2(skirt_h_mm()), " mm",
                 skirt_h_mm() < reg_engage_min_mm
                   ? "  -- BELOW reg_engage_min_mm, this is decoration not registration"
                   : "")));
  echo(str("carried by              : ", seats_on));
  echo(str("shoulder on rim         : ",
           seats_on != "nest_rim" ? "n/a -- shoulder floats by seat_relief_mm"
           : deck_nest_rim_w_mm < 0
             ? "NOT COMPUTED -- set deck_nest_rim_w_mm from a measurement"
             : str(r2(min(overhang_x_mm(), overhang_y_mm())), " mm of shoulder over a ",
                   deck_nest_rim_w_mm, " mm rim: ",
                   min(overhang_x_mm(), overhang_y_mm()) <= deck_nest_rim_w_mm
                     ? "PASS" : "FAIL -- shoulder overhangs the rim and will rock")));
  if (registration_style == "none")
    echo("HAZARD                  : registration_style is none. Nothing locates this fixture. A fixture that can move under gantry acceleration is a deck crash and a re-teach.");
  echo("");
  echo("--- what is not modeled ---");
  echo("recovery improvement    : NOT MODELED. Weigh it. See hardware/README.md.");
  echo("sample contact          : NOT QUALIFIED. This is a holder; the plate is the barrier.");
  echo("");
}


// =============================================================================
// 10. GEOMETRY
// =============================================================================

// Rounded rectangle, centered. Radius is clamped so a small part cannot produce
// a degenerate profile.
module rrect(l, w, r) {
  rr = min(r, l / 2 - 0.01, w / 2 - 0.01);
  offset(r = rr) square([l - 2 * rr, w - 2 * rr], center = true);
}

// Places children from the seat-plane frame (origin at the platform center, seat
// plane at z = 0, +x downhill) into the deck frame.
module tilt_place() {
  translate([0, 0, pivot_z()])
    rotate([-cross_tilt_deg, tilt_angle_deg, 0])
      children();
}

// The platform slab. Seat surface is its top face, at z = 0 in the seat frame.
module platform_slab() {
  translate([0, 0, -plat_t()])
    linear_extrude(height = plat_t())
      rrect(plat_len(), plat_wid(), plat_r());
}

// Full lip ring at height h, outer face tapering inward going up so the root is
// thicker than the tip. The inner face stays vertical: that is the plate contact
// and it should be a face, not a slope.
module lip_ring(h) {
  difference() {
    linear_extrude(height = h,
                   scale = [(plat_len() - 2 * lip_fillet_mm) / plat_len(),
                            (plat_wid() - 2 * lip_fillet_mm) / plat_wid()])
      rrect(plat_len(), plat_wid(), plat_r());
    translate([0, 0, -1])
      linear_extrude(height = h + 2)
        rrect(pocket_len(), pocket_wid(), pocket_r());
  }
}

// Lead-in chamfer at the top inner edge of a lip of height h. Cut per lip rather
// than once globally, because the uphill lips may be shorter and a single cut at
// one height would either miss them or take a second bite out of the tall ones.
module lip_lead_in_cut(h) {
  translate([0, 0, h - lip_lead_in_mm])
    linear_extrude(height = lip_lead_in_mm + 0.1,
                   scale = [(pocket_len() + 2 * lip_lead_in_mm) / pocket_len(),
                            (pocket_wid() + 2 * lip_lead_in_mm) / pocket_wid()])
      rrect(pocket_len(), pocket_wid(), pocket_r());
}

// One corner lip, in the (+x, +y) quadrant, cut out of the full ring so its
// cross-section and corner radius are exactly the ring's.
module lip_corner_pp(h) {
  ox = plat_len() / 2;
  oy = plat_wid() / 2;
  band = lip_thickness_mm + lip_fillet_mm;
  intersection() {
    difference() {
      lip_ring(h);
      lip_lead_in_cut(h);
    }
    union() {
      translate([ox - lip_arm_mm, oy - band - 1, -1])
        cube([lip_arm_mm + 1, band + 2, h + 2]);
      translate([ox - band - 1, oy - lip_arm_mm, -1])
        cube([band + 2, lip_arm_mm + 1, h + 2]);
    }
  }
}

// Four corner lips. Downhill corners (+x) get lip_height_mm; uphill corners get
// lip_height_uphill_mm, which can be dropped for gripper clearance because the
// uphill lip only does work during transport and placement.
module lips_all() {
  if (lip_style_is_corners()) {
    lip_corner_pp(lip_height_mm);                                        // +x +y downhill
    mirror([0, 1, 0]) lip_corner_pp(lip_height_mm);                      // +x -y downhill
    mirror([1, 0, 0]) lip_corner_pp(lip_height_uphill_mm);               // -x +y uphill
    mirror([1, 0, 0]) mirror([0, 1, 0])
      lip_corner_pp(lip_height_uphill_mm);                               // -x -y uphill
  } else {
    difference() {
      lip_ring(lip_height_mm);
      lip_lead_in_cut(lip_height_mm);
      // Keep the downhill mid-side drain open even on a continuous ring.
      translate([plat_len() / 2 - 20, -drain_slot_w_mm / 2, -1])
        cube([40, drain_slot_w_mm, lip_height_mm + 2]);
    }
  }
}

function lip_style_is_corners() = lip_style == "corners";

// Relieved seat center plus the downhill drain channel.
module seat_relief_cut() {
  translate([0, 0, -seat_relief_depth_mm])
    linear_extrude(height = seat_relief_depth_mm + 1)
      union() {
        rrect(pocket_len() - 2 * seat_band_mm,
              pocket_wid() - 2 * seat_band_mm,
              max(pocket_r() - seat_band_mm, 1));
        // channel out through the downhill edge
        translate([plat_len() / 4, 0])
          square([plat_len() / 2 + 2, drain_slot_w_mm], center = true);
      }
}

// Flat slab spanning the whole footprint.
module body_slab() {
  translate([0, 0, body_bottom_z()])
    linear_extrude(height = base_t())
      rrect(body_len(), body_wid(), body_r());
}

// The wedge: a hull from the body slab top to the tilted platform's bottom face.
module wedge() {
  hull() {
    tilt_place()
      translate([0, 0, -plat_t()])
        linear_extrude(height = 0.01)
          rrect(plat_len(), plat_wid(), plat_r());
    translate([0, 0, body_top_z() - 0.01])
      linear_extrude(height = 0.01)
        rrect(body_len(), body_wid(), body_r());
  }
}

// SLAS-footprint registration skirt: a continuous hollow wall under the body.
// SLAS 1 4.1.1.3 requires the footprint be continuous and uninterrupted around
// the base. So does this one, for the same reason -- a gap snags a nest.
module skirt() {
  h = skirt_h_mm();
  if (h > 0)
    linear_extrude(height = h)
      difference() {
        rrect(skirt_len(), skirt_wid(), skirt_r());
        rrect(skirt_len() - 2 * wall_mm, skirt_wid() - 2 * wall_mm,
              max(skirt_r() - wall_mm, 0.5));
      }
}

// Locating posts, when the deck offers holes rather than a nest. Two, on the
// long axis. See the reg_post_* comment for why not four.
module posts() {
  if (registration_style == "post" && reg_post_d_mm > 0)
    for (sx = [-1, 1])
      translate([sx * reg_post_pitch_x_mm / 2, 0, -reg_post_h_mm])
        cylinder(h = reg_post_h_mm + 0.01,
                 d = reg_post_d_mm - 2 * deck_clearance_mm);
}

module registration_feature() {
  if (registration_style == "slas_skirt") skirt();
  else if (registration_style == "post") posts();
}

// Everything above the deck, without the registration feature. Factored out so
// the coupon can cut a corner from the identical geometry rather than a
// re-derivation of it -- a coupon that models the feature separately validates
// the coupon, not the fixture.
module upper_solid() {
  difference() {
    union() {
      body_slab();
      wedge();
      tilt_place() union() {
        platform_slab();
        lips_all();
      }
    }
    tilt_place() seat_relief_cut();
  }
}

module tilt_fixture() {
  assert(deck_measured,
         "REFUSING TO RENDER: deck_measured is false. An unlocated fixture is a deck crash. Put calipers on the deck position, set deck_nest_depth_mm (or the reg_post_* values), then set deck_measured = true. Render part=\"coupon\" first -- it has no such requirement.");
  assert(registration_style != "slas_skirt" || deck_nest_depth_mm > 0,
         "REFUSING TO RENDER: registration_style is \"slas_skirt\" but deck_nest_depth_mm is unmeasured.");
  assert(registration_style != "post" ||
         (reg_post_d_mm > 0 && reg_post_pitch_x_mm > 0 && reg_post_h_mm > 0),
         "REFUSING TO RENDER: registration_style is \"post\" but one or more reg_post_* values are unmeasured.");

  difference() {
    union() {
      registration_feature();
      upper_solid();
    }
    // Trim anything that strayed below the registration datum.
    translate([-400, -400, -400 + min(0, -reg_post_h_mm)])
      cube([800, 800, 400]);
  }
}


// =============================================================================
// 11. TEST COUPON
// =============================================================================

// The downhill (+x, +y) corner of the real fixture, trimmed to a printable pad.
// Cut from upper_solid() rather than re-modeled, so what you measure on the
// coupon is what the fixture will do. A coupon built from its own geometry
// validates the coupon.
module coupon_seat_corner() {
  s = coupon_sample_mm;
  z0 = body_bottom_z();
  ztop = seat_low_z() + lip_height_mm + 2;
  translate([-(body_len() / 2 - s), -(body_wid() / 2 - s), -z0])
    intersection() {
      upper_solid();
      translate([body_len() / 2 - s, body_wid() / 2 - s, z0 - 0.01])
        cube([s + 2, s + 2, ztop - z0 + 1]);
    }
}

// A corner of the registration skirt at its real wall thickness and radius.
module coupon_skirt_corner() {
  s = coupon_sample_mm;
  h = max(skirt_h_mm(), 4.0);  // if the nest is unmeasured, print a 4 mm sample
  translate([-(skirt_len() / 2 - s), -(skirt_wid() / 2 - s), 0])
    intersection() {
      linear_extrude(height = h)
        difference() {
          rrect(skirt_len(), skirt_wid(), skirt_r());
          rrect(skirt_len() - 2 * wall_mm, skirt_wid() - 2 * wall_mm,
                max(skirt_r() - wall_mm, 0.5));
        }
      translate([skirt_len() / 2 - s, skirt_wid() / 2 - s, -1])
        cube([s + 2, s + 2, h + 2]);
    }
}

// Witness block. Measure all three axes with calipers. X and Y give the printer's
// in-plane scale error, which is what clearance_mm and deck_clearance_mm are
// compensating for. Z gives layer quantization plus first-layer squish, which is
// a constant offset on total height rather than a percentage, so do not convert
// the Z error to a percent and apply it to a length.
//
// coupon_gauge_z_mm is deliberately NOT a multiple of any common layer height.
// A 20.0 mm tall gauge at a 0.2 mm layer is an exact multiple and hides the
// quantization entirely; total height is forced to first_layer + n * layer, so a
// height that lands between two layers is the only one that shows you the error.
module coupon_gauge() {
  cube([coupon_gauge_mm, coupon_gauge_mm, coupon_gauge_z_mm]);
}

module test_coupon() {
  s     = coupon_sample_mm + 2;
  pad_l = 2 * s + coupon_gauge_mm + 22;
  pad_w = s + 8;
  difference() {
    union() {
      cube([pad_l, pad_w, coupon_pad_t_mm]);
      translate([4, 4, coupon_pad_t_mm]) coupon_seat_corner();
      translate([s + 10, 4, coupon_pad_t_mm]) coupon_skirt_corner();
      translate([2 * s + 16, 4, coupon_pad_t_mm]) coupon_gauge();
    }
    // Nothing below the pad.
    translate([-10, -10, -20]) cube([pad_l + 20, pad_w + 20, 20]);
  }
}


// =============================================================================
// 12. TOP LEVEL
// =============================================================================

report();

if (part == "fixture" || part == "both") tilt_fixture();
if (part == "coupon" || part == "both")
  translate([part == "both" ? body_len() / 2 + 30 : 0, 0, 0]) test_coupon();
